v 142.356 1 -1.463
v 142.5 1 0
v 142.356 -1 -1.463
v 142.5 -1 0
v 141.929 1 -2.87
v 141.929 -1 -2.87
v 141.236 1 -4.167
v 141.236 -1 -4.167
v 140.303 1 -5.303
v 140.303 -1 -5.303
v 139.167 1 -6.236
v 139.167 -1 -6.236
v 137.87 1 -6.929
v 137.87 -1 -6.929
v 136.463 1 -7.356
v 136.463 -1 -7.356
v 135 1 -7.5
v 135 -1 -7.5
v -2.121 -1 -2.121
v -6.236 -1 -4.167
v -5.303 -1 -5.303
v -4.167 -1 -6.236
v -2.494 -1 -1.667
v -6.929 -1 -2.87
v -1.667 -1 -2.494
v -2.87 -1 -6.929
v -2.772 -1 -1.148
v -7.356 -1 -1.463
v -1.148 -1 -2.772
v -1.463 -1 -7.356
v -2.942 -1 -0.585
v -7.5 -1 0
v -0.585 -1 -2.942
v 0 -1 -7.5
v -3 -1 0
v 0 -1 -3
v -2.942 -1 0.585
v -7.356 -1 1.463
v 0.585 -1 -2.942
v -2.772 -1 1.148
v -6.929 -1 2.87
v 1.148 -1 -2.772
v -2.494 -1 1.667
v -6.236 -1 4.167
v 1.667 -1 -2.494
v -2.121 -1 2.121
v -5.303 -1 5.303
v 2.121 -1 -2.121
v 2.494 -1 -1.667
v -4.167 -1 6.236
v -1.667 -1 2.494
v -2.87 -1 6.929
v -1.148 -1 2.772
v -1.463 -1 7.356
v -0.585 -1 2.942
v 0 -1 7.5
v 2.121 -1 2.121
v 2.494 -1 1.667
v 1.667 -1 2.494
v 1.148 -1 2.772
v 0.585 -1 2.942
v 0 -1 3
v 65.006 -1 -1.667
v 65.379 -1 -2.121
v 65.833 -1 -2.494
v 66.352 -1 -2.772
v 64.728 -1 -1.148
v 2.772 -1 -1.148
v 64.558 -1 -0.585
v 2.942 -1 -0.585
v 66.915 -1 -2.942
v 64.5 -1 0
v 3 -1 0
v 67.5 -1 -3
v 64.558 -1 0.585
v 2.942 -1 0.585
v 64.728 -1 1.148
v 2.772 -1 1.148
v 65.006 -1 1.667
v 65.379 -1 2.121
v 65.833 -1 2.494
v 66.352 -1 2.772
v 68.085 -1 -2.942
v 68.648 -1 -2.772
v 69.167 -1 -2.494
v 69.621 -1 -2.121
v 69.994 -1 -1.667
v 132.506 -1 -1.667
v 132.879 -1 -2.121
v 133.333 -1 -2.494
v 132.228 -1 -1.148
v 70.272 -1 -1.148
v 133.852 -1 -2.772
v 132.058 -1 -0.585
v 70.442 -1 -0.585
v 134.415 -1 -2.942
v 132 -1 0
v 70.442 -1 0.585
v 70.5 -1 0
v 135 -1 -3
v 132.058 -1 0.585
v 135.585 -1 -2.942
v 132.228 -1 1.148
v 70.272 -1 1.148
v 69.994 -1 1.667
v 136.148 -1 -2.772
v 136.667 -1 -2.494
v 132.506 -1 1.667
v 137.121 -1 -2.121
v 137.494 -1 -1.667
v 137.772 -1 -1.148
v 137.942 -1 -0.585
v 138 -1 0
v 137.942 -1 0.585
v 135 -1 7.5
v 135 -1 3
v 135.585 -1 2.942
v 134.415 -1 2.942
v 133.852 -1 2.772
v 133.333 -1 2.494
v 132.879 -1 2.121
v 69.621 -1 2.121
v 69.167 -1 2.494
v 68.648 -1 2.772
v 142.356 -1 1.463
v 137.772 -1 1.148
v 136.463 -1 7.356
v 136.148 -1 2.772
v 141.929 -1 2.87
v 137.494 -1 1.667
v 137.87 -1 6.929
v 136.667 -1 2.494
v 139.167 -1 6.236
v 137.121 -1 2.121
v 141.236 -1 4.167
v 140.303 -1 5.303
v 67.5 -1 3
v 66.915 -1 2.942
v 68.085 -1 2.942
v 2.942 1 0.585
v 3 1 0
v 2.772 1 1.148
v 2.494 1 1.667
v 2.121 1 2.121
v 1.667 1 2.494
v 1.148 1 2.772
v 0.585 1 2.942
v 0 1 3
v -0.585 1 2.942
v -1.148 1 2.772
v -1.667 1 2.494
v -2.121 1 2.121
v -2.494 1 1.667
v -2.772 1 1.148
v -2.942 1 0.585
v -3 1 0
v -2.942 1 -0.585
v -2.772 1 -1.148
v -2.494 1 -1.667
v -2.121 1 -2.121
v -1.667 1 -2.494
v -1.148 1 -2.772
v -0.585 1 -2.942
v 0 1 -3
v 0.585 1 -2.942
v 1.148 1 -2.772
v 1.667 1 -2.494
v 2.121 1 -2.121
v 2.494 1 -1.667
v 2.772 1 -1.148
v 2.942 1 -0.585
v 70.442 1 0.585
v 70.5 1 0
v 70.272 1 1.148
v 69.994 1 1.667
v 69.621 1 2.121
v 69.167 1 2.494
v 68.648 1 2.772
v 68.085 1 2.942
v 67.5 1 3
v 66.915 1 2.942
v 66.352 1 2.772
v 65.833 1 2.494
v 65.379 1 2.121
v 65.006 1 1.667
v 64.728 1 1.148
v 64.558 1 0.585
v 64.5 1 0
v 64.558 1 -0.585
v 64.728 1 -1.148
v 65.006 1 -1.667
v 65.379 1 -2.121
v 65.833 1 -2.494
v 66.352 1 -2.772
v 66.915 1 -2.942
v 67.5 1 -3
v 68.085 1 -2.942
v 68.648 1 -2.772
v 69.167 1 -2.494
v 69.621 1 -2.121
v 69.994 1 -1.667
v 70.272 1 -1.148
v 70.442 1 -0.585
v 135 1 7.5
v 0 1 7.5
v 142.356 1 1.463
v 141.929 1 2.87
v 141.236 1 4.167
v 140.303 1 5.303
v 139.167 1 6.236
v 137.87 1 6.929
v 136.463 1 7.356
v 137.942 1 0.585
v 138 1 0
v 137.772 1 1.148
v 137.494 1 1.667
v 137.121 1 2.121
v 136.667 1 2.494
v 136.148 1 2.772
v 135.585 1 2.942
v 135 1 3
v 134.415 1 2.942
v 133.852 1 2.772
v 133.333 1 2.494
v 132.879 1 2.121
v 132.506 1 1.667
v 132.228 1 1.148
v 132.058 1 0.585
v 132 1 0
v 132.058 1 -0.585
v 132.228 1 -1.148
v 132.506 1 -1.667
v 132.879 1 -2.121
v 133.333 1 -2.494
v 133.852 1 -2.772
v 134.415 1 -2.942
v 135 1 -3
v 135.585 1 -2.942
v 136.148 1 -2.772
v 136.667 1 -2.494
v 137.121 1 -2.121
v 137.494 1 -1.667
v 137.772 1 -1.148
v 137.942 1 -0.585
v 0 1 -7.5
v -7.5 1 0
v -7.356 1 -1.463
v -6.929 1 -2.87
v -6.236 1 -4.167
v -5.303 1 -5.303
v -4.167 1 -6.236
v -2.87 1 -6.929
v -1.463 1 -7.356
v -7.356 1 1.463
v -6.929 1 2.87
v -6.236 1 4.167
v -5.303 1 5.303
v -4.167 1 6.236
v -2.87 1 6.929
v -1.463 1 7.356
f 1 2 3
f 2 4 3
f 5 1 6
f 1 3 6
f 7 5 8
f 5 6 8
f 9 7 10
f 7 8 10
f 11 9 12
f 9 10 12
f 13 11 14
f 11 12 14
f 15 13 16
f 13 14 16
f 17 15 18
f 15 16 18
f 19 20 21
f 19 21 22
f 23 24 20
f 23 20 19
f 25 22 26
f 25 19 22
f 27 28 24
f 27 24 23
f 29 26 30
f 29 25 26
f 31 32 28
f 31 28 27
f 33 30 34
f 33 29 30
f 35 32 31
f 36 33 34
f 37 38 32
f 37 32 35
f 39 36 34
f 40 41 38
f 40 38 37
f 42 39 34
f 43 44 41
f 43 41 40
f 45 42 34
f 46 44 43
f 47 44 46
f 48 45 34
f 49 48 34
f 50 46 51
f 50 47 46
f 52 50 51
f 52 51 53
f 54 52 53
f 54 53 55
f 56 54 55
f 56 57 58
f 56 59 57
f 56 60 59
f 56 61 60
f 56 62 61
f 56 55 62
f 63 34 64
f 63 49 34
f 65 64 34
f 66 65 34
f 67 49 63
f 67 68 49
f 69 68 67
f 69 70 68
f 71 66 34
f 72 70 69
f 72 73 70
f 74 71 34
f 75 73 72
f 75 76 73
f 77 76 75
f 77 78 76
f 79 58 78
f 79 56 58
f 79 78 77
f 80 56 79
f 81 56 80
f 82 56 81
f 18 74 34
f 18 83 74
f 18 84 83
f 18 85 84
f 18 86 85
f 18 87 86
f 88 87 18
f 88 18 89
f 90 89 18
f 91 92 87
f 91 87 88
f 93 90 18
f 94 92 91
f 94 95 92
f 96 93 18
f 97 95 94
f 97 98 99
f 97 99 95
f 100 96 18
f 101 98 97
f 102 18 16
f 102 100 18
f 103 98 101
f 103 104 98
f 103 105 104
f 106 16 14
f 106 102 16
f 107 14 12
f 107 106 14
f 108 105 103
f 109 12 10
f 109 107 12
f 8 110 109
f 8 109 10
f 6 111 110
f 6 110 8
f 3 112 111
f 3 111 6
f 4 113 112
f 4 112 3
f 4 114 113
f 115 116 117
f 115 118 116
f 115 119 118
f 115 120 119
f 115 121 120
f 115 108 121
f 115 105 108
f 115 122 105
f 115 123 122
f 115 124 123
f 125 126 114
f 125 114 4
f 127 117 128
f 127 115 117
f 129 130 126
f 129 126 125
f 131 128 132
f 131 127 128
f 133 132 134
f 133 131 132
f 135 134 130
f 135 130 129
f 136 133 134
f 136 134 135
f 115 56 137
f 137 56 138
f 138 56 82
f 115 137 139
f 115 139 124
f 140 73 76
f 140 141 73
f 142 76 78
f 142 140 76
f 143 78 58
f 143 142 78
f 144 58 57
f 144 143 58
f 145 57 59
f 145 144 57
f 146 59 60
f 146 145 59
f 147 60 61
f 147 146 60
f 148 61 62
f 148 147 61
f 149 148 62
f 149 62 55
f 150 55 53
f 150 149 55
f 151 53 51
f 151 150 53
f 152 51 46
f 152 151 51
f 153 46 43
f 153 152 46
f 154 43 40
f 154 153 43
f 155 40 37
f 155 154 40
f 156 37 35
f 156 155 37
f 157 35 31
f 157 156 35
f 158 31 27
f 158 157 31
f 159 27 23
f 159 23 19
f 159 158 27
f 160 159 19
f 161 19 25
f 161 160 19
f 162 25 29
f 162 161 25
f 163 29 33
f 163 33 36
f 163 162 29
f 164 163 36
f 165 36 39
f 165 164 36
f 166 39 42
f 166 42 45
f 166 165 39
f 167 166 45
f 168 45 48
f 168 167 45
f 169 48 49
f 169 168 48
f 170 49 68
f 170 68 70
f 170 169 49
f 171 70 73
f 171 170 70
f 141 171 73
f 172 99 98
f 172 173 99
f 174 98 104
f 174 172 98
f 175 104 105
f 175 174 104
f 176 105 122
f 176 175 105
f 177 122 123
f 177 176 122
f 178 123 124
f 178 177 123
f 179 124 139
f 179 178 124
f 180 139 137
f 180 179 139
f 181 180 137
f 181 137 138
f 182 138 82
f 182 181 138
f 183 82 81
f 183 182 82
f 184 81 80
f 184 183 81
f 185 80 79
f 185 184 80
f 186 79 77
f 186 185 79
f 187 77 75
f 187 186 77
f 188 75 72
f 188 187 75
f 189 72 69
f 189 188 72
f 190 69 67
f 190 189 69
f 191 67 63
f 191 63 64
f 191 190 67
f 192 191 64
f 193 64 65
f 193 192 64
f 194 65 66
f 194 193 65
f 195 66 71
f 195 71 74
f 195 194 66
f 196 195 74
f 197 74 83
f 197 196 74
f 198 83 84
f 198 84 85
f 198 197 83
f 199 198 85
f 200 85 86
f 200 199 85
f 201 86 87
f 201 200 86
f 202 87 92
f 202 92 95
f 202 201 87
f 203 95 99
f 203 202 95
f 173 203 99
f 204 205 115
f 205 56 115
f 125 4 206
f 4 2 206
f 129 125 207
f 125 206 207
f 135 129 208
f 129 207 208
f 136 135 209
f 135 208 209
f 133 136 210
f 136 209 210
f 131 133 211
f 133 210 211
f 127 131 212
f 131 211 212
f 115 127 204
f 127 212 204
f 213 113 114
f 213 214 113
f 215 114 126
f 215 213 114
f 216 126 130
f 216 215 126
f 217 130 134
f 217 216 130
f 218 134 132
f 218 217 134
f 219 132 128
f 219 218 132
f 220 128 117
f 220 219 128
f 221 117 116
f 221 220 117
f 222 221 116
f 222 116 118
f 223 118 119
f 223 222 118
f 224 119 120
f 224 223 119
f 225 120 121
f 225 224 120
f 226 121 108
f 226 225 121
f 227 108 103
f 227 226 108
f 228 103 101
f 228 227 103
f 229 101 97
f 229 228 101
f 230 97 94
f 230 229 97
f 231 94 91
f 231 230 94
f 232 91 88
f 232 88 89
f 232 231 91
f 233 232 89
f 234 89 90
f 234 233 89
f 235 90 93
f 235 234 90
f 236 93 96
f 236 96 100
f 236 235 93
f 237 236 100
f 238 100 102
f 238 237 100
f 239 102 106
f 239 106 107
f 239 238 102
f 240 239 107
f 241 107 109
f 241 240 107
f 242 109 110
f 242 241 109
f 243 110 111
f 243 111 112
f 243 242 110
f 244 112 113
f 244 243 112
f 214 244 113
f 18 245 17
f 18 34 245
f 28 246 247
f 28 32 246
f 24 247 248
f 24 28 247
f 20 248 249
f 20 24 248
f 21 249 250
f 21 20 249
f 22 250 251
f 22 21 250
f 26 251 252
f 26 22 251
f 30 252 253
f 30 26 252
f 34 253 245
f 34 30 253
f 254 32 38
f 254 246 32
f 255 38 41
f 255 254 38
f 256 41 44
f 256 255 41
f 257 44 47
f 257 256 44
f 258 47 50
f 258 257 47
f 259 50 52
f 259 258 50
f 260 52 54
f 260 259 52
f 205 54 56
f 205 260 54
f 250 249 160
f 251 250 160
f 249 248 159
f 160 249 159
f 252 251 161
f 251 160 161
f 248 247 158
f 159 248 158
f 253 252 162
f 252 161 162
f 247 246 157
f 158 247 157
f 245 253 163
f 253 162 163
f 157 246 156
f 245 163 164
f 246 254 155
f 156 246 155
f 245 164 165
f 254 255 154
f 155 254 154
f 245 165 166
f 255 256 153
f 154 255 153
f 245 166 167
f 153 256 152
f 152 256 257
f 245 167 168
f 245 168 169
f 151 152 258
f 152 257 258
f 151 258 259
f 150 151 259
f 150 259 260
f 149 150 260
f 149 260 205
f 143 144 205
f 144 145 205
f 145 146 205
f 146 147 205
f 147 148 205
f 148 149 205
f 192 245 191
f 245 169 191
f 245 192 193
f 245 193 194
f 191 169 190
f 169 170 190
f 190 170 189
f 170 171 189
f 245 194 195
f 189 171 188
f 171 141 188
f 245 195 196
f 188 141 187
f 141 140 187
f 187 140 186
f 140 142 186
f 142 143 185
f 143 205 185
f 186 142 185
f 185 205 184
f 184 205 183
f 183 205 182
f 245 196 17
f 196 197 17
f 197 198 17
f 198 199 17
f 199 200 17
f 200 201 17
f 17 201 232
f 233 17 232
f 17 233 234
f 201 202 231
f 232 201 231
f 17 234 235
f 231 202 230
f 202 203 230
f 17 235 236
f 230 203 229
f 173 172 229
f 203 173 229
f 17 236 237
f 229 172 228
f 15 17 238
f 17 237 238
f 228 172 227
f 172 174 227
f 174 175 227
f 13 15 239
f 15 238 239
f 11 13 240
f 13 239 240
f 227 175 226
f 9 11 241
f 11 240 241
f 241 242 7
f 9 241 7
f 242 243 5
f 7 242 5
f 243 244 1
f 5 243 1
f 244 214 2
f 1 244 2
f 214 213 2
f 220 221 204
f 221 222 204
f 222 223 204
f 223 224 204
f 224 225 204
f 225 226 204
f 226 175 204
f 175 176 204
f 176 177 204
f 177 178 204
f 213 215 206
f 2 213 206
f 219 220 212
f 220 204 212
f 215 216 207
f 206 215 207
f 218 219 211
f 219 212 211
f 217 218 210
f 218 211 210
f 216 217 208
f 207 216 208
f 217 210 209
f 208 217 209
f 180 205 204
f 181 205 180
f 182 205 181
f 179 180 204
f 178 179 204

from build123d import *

# Parameters (mm, degrees)
F0_W     = 150
F0_H     = 15
F0_R     = 3
F1_DEPTH = 1
F2_R     = 7.49999


# Not quite as in the source:
# - a fillet or chamfer is up to 0.001 mm smaller than in the source, because OpenCascade refuses the exact size


with BuildPart() as f1:
    # F0 (on Front) → F1 (new body, symmetric)
    with BuildSketch(Plane.XZ):
        with Locations((67.5, 0)):
            Rectangle(F0_W, F0_H)
        Circle(F0_R, mode=Mode.SUBTRACT)
        with Locations((67.5, 0)):
            Circle(F0_R, mode=Mode.SUBTRACT)
        with Locations((135, 0)):
            Circle(F0_R, mode=Mode.SUBTRACT)
    extrude(amount=F1_DEPTH, both=True)

    # F2 (radius 7.5 in the source; OpenCascade refuses exactly that, so slightly less here)
    f2_edges = [f1.edges().sort_by_distance(p)[0] for p in [
        (142.5, 0, 7.5),
        (142.5, 0, -7.5),
        (-7.5, 0, 7.5),
        (-7.5, 0, -7.5),
    ]]
    fillet(f2_edges, radius=F2_R)


solid = f1.part
